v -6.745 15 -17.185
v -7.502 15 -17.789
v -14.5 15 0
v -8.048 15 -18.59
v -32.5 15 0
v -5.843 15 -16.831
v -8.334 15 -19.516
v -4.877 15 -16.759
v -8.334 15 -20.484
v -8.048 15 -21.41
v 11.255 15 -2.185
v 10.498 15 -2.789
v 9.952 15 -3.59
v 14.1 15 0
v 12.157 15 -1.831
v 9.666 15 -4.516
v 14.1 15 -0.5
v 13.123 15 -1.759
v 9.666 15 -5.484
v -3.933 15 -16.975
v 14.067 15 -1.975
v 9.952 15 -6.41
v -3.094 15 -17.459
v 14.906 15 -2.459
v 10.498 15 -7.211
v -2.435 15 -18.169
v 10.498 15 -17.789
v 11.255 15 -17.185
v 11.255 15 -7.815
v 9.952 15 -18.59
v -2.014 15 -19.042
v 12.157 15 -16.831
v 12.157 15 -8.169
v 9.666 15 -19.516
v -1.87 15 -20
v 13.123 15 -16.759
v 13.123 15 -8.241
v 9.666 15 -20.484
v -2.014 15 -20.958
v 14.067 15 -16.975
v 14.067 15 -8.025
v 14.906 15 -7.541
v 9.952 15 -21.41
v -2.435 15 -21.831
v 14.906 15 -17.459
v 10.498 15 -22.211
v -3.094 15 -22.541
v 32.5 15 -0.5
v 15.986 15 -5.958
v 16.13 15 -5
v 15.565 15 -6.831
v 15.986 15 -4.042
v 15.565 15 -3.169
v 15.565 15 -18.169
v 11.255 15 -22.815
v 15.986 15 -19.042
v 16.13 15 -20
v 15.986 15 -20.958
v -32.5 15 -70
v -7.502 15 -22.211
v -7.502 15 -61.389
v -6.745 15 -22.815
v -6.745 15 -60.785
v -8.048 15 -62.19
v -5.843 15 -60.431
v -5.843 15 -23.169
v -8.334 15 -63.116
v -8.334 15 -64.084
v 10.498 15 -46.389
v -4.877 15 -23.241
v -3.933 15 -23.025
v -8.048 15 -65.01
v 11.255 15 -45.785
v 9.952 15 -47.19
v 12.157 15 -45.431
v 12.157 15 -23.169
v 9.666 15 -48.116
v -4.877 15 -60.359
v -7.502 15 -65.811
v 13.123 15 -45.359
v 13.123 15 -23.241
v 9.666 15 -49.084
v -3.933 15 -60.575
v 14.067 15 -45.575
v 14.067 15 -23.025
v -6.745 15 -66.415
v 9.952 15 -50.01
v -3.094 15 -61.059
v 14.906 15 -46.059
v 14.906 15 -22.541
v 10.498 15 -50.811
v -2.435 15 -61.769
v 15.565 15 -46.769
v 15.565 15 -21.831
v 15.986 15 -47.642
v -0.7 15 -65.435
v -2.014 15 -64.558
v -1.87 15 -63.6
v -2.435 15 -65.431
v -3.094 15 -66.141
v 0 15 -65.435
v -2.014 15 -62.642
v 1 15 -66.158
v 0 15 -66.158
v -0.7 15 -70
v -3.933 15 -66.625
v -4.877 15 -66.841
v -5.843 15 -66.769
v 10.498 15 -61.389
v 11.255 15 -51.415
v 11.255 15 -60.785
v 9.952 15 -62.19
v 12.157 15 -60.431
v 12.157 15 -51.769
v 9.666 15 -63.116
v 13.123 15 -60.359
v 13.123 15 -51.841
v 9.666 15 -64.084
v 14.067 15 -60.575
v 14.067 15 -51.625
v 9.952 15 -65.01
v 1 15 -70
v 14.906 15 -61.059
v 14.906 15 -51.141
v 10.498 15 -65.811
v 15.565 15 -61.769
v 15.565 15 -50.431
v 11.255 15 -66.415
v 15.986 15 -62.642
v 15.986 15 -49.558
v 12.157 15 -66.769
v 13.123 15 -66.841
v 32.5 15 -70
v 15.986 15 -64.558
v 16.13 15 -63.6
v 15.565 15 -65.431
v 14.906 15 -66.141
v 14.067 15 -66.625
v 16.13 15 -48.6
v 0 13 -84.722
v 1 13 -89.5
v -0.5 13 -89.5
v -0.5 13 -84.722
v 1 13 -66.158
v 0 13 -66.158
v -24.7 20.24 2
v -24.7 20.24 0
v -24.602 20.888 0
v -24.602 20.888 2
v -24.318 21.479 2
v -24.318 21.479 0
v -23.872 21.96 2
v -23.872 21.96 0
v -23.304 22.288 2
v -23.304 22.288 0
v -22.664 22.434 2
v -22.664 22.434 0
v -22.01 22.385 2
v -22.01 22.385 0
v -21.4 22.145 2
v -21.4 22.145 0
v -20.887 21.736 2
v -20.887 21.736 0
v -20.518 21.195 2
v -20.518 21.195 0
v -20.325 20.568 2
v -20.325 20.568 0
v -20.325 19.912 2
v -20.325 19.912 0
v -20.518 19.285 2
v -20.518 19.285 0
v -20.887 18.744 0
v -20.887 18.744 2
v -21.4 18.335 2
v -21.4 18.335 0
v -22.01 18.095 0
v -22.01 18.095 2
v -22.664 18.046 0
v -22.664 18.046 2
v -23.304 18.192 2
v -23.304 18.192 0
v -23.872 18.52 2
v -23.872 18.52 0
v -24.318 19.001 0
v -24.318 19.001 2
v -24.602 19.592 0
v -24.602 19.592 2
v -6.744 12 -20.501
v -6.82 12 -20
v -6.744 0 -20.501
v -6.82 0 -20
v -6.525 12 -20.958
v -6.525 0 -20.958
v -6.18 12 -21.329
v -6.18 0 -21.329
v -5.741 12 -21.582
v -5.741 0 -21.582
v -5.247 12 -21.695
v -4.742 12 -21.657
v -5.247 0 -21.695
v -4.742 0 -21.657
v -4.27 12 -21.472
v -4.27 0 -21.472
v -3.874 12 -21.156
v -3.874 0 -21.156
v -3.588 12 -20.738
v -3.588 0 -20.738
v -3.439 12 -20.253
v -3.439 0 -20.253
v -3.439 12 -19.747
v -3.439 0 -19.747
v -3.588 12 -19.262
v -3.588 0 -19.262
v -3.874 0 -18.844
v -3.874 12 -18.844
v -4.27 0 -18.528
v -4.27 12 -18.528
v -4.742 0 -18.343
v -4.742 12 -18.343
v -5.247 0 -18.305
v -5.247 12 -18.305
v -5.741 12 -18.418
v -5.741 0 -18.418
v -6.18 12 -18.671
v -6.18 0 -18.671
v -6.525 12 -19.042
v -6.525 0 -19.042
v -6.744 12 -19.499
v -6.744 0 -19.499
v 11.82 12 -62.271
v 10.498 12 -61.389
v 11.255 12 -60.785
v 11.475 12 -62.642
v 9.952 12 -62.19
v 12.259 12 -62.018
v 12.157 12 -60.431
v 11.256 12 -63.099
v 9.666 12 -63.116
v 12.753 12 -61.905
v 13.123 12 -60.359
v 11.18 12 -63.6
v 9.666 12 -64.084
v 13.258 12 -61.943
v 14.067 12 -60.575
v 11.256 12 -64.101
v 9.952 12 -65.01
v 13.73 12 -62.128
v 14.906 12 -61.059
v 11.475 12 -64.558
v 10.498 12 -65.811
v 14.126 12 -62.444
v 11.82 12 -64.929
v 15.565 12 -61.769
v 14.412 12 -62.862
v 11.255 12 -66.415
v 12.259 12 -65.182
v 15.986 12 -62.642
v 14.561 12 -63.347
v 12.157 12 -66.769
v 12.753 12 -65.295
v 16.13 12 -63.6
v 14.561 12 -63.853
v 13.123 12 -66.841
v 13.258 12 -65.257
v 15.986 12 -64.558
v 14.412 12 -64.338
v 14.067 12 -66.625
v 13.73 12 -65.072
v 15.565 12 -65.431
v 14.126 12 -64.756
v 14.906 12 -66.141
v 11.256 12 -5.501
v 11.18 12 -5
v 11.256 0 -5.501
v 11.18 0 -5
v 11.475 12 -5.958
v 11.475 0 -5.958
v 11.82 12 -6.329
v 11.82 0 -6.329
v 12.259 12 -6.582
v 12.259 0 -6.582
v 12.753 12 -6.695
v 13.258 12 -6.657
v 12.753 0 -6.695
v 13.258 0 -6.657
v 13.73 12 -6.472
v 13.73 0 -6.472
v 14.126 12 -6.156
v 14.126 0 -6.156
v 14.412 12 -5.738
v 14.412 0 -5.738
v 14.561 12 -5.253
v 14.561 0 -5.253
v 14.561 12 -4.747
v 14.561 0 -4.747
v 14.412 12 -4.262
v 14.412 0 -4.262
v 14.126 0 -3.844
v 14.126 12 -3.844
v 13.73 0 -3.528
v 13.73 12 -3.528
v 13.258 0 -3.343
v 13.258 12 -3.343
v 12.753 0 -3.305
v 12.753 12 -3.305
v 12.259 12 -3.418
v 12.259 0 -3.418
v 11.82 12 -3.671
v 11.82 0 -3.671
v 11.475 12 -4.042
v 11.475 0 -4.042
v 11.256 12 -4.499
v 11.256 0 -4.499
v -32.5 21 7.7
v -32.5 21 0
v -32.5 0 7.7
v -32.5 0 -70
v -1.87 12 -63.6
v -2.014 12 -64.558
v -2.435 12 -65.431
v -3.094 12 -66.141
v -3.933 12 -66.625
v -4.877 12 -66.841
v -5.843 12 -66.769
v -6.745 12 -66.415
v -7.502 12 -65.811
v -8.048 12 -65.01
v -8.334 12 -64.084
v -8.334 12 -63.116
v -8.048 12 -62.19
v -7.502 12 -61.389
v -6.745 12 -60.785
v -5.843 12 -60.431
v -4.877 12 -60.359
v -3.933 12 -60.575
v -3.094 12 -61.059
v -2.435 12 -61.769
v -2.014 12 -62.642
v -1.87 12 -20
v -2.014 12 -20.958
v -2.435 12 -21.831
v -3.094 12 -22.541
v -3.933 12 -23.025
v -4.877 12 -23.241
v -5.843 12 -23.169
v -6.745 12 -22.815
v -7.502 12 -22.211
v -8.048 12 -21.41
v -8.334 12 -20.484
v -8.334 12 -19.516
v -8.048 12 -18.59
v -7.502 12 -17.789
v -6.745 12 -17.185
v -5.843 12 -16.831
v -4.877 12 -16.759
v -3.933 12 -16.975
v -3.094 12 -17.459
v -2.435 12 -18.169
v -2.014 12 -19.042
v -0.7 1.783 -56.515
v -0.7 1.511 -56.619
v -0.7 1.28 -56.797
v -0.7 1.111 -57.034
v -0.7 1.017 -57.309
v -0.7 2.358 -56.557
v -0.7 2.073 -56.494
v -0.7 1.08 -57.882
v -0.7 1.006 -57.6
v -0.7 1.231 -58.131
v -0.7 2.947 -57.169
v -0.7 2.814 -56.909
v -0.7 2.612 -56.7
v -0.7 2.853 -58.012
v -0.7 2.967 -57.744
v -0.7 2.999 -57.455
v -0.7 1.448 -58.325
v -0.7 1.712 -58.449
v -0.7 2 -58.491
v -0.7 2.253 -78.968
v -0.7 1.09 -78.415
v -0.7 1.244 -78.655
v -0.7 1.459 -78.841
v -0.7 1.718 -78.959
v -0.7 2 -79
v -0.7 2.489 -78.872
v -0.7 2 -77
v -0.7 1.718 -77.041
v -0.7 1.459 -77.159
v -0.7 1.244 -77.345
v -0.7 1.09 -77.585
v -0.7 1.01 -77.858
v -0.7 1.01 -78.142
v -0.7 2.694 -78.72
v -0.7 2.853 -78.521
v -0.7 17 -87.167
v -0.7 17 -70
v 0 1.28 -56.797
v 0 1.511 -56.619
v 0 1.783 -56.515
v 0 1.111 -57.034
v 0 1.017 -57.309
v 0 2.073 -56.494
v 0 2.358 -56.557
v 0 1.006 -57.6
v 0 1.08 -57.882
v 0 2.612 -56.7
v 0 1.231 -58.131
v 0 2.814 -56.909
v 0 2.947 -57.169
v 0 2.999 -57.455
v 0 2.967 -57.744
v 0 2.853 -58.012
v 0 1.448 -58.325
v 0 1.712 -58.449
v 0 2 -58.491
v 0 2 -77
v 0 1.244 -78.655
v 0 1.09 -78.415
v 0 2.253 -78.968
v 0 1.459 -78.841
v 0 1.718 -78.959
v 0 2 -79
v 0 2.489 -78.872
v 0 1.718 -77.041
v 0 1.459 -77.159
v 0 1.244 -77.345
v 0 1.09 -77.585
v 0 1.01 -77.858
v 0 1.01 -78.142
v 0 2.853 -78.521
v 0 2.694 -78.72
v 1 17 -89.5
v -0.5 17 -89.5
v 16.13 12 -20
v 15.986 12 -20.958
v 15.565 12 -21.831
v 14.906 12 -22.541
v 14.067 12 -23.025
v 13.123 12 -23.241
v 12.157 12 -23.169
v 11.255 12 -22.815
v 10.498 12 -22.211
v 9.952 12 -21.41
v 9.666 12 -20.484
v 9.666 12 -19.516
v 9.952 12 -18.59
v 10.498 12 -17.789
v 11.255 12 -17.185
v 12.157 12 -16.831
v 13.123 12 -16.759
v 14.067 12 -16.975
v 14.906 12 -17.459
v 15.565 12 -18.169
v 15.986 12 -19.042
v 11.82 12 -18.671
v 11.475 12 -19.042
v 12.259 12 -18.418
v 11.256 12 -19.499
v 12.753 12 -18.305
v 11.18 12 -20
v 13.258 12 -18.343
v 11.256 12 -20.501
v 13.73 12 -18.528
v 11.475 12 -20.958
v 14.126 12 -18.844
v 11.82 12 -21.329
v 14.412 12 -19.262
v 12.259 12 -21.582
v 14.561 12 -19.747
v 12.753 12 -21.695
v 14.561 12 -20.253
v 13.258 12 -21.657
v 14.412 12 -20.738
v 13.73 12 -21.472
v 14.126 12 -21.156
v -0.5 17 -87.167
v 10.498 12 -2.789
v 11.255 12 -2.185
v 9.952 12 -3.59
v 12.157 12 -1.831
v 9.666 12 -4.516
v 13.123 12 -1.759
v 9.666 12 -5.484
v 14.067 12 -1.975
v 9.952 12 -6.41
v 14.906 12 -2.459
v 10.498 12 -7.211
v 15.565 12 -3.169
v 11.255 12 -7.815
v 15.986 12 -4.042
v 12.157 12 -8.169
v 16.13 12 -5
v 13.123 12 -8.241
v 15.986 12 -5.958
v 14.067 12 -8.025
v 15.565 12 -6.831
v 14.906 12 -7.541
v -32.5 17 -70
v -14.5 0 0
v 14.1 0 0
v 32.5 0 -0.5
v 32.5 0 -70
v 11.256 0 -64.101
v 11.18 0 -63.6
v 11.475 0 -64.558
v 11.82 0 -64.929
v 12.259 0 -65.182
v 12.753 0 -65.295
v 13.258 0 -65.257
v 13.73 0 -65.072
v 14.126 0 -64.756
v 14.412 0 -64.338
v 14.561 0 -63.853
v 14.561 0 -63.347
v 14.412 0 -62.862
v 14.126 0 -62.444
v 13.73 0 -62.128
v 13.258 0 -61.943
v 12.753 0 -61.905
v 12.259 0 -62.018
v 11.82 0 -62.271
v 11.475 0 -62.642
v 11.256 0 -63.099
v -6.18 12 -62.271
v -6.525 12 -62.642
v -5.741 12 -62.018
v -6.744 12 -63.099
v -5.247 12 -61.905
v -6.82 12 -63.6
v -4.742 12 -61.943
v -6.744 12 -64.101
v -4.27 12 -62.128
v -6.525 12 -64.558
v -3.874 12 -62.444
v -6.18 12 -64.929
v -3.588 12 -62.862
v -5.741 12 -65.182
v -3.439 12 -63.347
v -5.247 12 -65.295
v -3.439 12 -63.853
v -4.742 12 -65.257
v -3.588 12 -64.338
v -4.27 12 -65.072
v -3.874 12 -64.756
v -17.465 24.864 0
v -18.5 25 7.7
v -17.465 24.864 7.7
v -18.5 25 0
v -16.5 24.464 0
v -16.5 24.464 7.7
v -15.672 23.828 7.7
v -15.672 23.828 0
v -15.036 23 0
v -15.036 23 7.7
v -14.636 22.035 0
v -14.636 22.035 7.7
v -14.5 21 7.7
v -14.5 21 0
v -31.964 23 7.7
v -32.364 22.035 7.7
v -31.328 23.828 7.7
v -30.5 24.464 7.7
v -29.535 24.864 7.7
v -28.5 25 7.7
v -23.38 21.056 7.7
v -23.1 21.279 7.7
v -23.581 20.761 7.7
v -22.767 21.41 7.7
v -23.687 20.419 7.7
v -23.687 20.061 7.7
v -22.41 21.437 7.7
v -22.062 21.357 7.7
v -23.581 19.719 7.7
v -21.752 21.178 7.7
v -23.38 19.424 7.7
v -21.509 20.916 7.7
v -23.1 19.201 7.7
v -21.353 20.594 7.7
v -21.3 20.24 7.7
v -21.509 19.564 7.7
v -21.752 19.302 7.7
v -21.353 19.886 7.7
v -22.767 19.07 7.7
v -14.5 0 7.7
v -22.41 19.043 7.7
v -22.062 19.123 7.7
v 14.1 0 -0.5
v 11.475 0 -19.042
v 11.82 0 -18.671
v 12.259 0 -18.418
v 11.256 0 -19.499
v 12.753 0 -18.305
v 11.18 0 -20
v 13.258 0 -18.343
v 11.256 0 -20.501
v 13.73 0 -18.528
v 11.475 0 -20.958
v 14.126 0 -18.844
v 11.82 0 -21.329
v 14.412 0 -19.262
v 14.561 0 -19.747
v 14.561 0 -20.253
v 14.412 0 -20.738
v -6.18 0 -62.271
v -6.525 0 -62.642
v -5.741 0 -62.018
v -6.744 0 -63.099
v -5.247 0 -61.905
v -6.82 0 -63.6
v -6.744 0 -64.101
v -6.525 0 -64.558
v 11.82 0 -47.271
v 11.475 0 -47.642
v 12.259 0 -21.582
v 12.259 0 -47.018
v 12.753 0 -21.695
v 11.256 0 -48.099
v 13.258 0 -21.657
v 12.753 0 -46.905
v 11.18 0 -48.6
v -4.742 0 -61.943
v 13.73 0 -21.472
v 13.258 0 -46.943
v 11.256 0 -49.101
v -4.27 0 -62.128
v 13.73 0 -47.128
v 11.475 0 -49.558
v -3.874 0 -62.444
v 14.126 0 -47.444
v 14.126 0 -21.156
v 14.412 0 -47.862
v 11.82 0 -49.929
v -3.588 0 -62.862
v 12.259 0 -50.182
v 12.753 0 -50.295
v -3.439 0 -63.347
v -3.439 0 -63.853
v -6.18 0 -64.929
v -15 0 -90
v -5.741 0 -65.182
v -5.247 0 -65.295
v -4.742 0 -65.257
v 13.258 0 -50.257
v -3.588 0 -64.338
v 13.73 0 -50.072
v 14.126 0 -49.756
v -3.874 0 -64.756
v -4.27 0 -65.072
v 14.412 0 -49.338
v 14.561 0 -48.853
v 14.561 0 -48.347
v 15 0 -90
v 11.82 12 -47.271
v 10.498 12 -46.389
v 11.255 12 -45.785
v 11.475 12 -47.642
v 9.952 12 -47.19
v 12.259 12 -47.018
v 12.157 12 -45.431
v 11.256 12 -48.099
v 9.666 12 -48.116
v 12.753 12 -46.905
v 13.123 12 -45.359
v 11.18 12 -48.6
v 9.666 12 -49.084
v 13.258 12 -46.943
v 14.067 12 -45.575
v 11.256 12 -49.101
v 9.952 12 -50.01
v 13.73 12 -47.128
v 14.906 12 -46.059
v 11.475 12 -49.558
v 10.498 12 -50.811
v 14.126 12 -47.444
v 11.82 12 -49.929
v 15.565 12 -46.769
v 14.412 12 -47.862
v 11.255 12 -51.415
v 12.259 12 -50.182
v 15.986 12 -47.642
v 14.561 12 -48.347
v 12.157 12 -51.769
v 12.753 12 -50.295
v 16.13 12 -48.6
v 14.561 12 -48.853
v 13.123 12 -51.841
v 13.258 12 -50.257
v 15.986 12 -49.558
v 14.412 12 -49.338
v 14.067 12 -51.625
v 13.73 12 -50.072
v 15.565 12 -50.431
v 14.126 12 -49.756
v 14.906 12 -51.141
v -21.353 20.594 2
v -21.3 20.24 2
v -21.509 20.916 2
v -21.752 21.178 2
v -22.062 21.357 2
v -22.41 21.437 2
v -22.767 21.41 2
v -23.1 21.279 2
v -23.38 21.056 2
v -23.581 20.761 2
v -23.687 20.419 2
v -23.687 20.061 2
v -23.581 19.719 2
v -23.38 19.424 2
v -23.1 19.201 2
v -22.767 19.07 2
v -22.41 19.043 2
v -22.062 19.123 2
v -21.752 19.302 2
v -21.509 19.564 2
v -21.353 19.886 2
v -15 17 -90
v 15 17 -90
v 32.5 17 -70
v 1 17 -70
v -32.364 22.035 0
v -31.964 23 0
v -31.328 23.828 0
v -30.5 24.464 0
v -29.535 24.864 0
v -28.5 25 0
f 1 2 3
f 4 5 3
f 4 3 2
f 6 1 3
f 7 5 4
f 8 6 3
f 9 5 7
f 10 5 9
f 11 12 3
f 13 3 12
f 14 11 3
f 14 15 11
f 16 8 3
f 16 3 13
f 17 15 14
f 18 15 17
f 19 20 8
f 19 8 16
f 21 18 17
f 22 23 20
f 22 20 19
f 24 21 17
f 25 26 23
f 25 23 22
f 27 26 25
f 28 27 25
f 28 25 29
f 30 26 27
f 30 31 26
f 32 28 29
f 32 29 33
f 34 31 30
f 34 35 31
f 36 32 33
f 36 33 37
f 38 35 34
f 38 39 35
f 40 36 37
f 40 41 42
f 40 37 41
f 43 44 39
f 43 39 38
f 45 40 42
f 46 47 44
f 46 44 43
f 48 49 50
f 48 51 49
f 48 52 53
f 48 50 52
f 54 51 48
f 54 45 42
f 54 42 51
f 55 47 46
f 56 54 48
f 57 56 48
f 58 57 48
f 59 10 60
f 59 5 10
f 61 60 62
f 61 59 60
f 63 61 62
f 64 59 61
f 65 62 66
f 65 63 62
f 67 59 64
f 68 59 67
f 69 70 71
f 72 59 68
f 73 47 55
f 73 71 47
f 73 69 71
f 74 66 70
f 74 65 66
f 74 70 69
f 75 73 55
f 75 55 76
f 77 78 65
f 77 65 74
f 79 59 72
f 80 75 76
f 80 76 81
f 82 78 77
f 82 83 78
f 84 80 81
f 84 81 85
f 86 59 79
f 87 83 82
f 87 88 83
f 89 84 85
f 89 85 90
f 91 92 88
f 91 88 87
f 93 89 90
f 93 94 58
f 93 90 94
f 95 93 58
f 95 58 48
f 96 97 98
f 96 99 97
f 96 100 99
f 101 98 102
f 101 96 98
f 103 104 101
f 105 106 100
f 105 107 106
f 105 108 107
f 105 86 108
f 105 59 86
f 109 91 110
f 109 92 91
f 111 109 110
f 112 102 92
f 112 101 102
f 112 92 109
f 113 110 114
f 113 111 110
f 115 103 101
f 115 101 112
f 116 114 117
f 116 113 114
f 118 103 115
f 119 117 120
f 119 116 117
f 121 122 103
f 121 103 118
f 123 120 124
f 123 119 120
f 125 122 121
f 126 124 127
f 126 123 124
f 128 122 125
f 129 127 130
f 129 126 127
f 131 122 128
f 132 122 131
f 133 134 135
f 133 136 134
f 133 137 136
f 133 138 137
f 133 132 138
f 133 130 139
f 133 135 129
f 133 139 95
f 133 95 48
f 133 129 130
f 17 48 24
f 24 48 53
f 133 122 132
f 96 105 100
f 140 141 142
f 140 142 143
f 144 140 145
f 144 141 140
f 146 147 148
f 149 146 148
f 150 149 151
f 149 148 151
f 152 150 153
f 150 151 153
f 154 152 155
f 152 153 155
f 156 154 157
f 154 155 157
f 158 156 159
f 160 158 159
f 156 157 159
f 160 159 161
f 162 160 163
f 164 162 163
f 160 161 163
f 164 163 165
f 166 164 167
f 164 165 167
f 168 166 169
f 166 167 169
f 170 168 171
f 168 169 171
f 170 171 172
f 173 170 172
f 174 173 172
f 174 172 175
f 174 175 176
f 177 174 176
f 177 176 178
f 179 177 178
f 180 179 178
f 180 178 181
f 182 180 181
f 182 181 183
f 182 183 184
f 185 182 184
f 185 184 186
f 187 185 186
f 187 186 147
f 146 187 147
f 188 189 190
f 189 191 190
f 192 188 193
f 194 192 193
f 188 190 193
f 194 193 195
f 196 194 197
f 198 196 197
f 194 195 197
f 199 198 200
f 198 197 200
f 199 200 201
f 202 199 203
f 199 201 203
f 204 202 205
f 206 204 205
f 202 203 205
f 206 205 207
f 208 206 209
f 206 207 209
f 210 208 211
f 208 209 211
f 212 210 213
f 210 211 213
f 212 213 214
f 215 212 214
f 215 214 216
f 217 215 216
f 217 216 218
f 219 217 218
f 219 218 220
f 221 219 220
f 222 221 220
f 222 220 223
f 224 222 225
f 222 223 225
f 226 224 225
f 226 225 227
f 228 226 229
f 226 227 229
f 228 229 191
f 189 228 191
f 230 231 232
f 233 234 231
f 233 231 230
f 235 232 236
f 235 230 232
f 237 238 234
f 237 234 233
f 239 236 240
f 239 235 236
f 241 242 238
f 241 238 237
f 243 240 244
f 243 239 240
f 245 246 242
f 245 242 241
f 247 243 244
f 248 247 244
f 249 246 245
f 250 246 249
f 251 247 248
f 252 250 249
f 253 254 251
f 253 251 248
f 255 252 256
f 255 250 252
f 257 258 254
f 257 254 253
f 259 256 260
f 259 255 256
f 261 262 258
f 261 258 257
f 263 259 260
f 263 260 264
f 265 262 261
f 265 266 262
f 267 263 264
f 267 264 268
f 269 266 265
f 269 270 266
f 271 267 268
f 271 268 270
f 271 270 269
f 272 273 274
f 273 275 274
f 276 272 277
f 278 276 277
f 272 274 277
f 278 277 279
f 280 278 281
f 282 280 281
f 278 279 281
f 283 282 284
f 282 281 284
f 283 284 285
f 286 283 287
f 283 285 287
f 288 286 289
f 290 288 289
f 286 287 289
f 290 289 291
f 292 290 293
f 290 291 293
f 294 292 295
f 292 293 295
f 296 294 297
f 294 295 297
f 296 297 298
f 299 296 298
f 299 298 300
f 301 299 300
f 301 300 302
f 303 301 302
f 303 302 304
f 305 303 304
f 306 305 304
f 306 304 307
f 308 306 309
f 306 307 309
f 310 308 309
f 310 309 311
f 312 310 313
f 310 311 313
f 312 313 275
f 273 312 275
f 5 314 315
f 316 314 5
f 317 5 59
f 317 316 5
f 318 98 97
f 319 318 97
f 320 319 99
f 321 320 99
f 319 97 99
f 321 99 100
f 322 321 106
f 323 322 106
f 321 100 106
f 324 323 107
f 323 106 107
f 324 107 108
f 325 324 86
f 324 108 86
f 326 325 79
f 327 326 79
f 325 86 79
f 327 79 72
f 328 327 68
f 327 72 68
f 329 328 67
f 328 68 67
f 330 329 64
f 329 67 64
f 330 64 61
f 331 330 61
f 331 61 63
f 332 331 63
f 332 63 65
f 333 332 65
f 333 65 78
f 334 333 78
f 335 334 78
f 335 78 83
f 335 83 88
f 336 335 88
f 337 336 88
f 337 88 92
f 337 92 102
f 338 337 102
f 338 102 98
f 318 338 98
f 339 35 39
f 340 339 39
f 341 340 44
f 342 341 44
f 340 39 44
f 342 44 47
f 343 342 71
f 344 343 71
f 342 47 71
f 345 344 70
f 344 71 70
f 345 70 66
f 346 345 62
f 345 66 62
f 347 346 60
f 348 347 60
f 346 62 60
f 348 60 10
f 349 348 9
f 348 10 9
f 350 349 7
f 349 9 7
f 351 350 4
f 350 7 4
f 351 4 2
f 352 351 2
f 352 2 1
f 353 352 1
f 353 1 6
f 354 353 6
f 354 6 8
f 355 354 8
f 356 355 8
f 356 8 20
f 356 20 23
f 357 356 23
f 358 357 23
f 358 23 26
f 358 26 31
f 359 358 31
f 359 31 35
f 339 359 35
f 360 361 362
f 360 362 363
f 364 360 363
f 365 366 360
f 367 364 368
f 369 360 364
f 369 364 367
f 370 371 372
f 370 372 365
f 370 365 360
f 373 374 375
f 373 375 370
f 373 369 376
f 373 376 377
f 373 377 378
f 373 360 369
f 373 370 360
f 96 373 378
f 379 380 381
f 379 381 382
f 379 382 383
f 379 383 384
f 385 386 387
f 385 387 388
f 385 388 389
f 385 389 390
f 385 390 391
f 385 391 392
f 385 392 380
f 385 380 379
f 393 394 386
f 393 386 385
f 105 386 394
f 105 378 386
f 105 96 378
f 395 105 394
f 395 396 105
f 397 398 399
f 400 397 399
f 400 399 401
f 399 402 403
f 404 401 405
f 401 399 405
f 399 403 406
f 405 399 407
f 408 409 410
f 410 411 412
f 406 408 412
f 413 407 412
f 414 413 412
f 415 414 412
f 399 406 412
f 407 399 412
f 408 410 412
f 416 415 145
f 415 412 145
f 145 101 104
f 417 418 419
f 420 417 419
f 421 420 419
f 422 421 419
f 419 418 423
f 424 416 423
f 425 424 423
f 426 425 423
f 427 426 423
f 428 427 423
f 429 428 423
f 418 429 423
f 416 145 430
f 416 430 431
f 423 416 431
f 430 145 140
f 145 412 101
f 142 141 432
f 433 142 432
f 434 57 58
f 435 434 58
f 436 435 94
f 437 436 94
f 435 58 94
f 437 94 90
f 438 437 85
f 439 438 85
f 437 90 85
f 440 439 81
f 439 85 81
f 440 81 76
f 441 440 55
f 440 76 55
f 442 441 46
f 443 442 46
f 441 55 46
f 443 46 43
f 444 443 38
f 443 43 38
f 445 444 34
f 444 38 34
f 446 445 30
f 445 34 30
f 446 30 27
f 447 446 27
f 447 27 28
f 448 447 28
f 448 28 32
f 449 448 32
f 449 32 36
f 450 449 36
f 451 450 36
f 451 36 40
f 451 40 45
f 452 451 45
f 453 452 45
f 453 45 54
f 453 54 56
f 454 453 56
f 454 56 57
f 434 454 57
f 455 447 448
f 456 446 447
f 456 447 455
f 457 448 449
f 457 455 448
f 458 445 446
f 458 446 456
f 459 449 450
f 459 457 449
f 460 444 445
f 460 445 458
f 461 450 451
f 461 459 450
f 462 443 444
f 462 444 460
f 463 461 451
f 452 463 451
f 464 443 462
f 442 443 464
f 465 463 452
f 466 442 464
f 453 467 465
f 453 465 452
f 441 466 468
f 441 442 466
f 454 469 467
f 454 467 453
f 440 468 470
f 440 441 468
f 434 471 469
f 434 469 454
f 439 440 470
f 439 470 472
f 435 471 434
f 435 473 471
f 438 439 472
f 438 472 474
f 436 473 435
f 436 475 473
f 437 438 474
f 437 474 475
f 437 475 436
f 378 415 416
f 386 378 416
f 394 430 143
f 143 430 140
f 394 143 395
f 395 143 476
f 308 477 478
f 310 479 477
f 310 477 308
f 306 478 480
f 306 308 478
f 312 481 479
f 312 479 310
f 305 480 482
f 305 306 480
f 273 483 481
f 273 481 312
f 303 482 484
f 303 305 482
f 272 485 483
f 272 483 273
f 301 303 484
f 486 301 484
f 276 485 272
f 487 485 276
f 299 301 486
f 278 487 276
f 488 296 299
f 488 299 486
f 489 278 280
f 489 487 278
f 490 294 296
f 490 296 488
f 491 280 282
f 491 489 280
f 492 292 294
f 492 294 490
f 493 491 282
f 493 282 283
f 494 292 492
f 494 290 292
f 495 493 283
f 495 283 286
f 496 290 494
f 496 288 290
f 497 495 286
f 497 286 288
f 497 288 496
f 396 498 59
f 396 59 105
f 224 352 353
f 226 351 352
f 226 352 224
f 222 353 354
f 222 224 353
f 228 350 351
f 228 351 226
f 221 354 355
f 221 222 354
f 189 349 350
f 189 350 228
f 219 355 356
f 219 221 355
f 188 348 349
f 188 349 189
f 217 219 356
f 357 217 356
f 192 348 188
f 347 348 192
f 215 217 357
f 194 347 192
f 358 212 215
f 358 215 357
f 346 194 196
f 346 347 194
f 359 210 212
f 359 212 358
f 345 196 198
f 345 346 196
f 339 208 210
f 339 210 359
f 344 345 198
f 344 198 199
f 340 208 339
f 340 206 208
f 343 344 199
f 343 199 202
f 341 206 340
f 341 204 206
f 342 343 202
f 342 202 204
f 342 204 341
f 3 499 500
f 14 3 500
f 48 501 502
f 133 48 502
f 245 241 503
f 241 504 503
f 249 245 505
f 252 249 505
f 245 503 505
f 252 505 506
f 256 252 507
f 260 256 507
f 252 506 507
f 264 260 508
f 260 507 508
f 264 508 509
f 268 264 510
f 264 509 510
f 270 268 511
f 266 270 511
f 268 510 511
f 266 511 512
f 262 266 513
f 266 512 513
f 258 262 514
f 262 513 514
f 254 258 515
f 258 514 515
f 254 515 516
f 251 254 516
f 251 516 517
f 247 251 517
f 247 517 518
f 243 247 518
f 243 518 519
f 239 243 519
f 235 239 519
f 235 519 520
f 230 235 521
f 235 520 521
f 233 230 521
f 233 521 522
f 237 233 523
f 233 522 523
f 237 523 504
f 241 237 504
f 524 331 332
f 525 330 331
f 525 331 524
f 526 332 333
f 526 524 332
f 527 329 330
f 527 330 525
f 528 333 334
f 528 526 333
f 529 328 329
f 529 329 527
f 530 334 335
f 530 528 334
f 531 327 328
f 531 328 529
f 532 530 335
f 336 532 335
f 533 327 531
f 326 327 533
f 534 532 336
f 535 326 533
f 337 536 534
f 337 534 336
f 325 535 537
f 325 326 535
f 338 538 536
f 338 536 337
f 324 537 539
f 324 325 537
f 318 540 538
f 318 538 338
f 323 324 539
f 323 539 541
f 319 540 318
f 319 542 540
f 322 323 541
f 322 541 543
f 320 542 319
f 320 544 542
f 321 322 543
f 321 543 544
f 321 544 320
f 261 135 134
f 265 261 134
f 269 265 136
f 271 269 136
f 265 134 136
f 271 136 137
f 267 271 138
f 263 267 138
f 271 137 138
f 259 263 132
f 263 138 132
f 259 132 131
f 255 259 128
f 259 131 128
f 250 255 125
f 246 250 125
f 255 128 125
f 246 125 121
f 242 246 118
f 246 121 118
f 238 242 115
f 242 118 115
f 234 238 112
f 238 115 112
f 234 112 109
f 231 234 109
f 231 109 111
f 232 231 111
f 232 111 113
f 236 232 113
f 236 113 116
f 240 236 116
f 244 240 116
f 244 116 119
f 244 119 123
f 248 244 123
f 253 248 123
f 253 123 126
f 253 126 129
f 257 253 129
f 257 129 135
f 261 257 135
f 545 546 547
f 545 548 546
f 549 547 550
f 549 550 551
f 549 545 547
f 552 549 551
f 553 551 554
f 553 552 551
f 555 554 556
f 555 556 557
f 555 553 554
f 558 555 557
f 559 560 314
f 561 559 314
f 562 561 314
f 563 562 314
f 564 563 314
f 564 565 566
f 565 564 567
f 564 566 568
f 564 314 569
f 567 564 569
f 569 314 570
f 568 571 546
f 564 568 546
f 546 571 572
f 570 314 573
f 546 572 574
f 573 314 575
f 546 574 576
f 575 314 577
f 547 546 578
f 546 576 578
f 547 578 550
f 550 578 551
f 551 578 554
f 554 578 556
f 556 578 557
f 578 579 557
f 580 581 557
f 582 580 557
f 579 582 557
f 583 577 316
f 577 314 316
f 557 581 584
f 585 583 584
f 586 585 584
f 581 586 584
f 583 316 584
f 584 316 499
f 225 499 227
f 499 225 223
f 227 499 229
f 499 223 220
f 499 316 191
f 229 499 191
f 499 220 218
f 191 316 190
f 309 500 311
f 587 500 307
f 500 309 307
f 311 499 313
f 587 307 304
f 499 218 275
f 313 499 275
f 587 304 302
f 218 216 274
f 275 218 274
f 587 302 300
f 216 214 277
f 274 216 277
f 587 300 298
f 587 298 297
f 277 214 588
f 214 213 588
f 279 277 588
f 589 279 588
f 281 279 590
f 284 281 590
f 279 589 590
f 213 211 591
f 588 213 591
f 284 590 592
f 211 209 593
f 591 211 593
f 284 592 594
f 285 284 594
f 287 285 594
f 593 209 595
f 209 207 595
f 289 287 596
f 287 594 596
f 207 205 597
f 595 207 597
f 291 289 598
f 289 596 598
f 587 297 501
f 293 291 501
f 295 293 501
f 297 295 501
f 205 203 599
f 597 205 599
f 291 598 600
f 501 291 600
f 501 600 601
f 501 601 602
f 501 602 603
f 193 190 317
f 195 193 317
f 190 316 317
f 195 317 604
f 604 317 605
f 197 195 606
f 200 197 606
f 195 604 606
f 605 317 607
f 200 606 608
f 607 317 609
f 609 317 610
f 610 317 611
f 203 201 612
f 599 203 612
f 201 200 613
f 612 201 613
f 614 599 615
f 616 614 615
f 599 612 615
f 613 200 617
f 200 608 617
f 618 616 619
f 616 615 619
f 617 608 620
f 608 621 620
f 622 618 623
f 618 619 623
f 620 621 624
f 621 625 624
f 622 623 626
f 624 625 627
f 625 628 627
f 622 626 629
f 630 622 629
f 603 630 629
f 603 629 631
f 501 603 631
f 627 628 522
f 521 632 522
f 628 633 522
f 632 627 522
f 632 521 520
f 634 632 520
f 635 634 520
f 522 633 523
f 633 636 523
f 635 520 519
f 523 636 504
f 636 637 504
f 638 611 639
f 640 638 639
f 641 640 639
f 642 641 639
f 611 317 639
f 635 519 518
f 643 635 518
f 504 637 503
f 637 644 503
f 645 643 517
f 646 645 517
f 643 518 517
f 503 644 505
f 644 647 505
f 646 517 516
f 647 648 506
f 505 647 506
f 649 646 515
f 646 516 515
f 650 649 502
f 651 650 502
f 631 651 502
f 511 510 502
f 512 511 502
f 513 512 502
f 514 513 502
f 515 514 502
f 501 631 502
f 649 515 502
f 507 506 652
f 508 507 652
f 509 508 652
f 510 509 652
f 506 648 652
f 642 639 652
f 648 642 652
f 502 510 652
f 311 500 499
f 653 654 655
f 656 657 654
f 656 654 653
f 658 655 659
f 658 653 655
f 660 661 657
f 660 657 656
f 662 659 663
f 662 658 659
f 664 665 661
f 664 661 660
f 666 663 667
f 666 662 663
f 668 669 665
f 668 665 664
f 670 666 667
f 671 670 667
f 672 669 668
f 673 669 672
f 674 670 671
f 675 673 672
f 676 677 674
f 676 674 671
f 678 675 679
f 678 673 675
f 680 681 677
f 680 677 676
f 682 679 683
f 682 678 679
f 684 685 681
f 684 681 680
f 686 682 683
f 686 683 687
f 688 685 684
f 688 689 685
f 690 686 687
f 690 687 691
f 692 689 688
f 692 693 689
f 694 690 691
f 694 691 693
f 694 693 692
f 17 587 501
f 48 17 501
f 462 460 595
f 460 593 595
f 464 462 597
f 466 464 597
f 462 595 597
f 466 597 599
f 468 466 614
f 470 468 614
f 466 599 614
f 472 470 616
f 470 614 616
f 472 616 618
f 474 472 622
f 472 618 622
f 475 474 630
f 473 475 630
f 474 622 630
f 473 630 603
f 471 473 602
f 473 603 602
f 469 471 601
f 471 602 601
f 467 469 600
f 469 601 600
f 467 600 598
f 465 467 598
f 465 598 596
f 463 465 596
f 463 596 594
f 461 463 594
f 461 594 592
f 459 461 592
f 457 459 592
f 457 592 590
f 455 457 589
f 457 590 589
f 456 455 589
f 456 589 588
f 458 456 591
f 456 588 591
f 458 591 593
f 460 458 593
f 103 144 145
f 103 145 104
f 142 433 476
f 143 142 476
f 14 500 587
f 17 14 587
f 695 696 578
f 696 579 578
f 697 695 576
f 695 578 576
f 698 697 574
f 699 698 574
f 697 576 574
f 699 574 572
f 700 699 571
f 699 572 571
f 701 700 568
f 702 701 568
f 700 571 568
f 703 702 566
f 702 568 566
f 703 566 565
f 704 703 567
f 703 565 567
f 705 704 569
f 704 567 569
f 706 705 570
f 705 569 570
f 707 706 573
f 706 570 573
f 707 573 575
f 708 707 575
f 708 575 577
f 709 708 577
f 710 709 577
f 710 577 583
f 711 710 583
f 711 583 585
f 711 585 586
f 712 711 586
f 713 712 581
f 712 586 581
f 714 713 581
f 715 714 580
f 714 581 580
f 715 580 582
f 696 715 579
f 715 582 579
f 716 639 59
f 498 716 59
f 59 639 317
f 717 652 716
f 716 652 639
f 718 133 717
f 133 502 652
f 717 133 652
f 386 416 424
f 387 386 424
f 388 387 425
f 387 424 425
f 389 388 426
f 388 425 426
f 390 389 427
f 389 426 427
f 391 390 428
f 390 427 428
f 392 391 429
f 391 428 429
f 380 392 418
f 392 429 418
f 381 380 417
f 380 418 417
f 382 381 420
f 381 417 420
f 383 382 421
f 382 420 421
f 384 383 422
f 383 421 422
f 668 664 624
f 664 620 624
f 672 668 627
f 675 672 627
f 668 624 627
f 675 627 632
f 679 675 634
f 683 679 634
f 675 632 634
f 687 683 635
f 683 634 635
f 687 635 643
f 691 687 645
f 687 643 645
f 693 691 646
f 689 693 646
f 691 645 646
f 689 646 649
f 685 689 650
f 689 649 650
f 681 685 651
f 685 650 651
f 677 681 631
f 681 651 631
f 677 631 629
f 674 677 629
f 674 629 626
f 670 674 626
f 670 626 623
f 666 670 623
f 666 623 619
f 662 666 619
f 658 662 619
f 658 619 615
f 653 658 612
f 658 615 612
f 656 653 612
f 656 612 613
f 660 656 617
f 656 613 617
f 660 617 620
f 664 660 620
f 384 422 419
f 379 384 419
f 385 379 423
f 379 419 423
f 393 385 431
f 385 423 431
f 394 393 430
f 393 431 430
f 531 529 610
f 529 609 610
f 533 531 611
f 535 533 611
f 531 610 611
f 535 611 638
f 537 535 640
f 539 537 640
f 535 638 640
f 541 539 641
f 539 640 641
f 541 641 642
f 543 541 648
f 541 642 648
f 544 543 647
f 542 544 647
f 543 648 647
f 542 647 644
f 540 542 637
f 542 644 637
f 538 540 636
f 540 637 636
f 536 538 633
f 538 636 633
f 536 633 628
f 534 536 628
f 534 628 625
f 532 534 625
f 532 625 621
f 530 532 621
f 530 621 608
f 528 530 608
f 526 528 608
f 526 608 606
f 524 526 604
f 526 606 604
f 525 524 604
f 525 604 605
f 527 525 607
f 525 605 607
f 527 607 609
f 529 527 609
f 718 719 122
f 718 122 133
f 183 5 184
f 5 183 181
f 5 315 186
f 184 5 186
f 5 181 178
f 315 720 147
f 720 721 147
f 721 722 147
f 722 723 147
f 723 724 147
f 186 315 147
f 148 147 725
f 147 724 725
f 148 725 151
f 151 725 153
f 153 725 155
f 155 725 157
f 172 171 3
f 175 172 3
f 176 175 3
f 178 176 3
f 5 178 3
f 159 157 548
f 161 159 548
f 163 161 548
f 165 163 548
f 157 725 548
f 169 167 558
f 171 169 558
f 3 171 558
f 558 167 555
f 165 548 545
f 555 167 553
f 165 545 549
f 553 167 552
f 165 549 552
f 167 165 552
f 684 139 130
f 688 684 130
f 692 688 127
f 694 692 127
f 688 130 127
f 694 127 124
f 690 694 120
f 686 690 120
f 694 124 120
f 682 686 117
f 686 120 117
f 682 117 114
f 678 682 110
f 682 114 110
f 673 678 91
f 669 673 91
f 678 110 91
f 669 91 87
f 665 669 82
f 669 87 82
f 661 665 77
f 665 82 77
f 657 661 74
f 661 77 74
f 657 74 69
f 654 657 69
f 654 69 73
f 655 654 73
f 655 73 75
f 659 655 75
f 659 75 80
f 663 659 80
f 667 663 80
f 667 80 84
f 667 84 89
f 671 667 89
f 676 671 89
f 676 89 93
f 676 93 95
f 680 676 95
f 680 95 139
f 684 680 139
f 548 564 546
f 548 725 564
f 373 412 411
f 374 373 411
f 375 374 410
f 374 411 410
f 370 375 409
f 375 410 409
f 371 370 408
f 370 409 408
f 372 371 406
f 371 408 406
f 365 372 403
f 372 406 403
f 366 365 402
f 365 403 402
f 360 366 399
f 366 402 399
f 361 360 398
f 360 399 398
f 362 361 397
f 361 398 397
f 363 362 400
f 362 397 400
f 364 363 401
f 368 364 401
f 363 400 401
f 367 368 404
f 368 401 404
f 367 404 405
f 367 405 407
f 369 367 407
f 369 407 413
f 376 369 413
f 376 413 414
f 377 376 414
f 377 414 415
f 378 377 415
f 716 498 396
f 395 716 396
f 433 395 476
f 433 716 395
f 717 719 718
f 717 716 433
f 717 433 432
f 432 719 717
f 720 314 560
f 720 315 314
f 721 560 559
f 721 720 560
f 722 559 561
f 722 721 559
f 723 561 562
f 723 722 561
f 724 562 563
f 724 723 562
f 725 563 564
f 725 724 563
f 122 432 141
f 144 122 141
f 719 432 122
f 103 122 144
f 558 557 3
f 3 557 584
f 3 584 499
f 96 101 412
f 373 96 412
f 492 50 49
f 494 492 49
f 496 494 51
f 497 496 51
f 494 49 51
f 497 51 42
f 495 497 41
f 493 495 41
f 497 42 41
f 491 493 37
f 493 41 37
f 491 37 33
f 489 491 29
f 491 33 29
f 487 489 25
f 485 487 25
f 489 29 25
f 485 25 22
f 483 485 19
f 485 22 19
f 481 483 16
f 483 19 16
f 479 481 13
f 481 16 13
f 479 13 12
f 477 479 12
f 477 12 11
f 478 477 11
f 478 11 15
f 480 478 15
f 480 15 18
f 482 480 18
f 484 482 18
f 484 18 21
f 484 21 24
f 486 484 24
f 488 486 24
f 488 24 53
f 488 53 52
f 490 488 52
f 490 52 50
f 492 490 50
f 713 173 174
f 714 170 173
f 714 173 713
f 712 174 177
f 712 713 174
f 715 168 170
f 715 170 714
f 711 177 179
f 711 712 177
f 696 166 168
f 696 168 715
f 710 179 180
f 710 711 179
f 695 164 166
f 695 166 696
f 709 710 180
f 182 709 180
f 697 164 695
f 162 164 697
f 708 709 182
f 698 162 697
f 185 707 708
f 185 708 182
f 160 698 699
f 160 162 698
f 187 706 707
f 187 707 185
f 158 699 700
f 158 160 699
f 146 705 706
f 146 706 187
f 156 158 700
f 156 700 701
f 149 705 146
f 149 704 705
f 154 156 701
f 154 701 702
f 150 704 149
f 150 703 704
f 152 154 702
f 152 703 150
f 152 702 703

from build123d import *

# Parameters (mm, degrees)
BOSS_EXTRUDE1_DEPTH            = 17
BOSS_EXTRUDE2_START            = 17
SKETCH1_3_W                    = 18
SKETCH1_3_H                    = 7.7
BOSS_EXTRUDE2_DEPTH            = 8
SKETCH9_W                      = 65
SKETCH9_H                      = 70
CUT_EXTRUDE5_DEPTH             = 2
CBORE_FOR_M3_SHCS2_D           = 3.4
CBORE_FOR_M3_SHCS2_CBORE_D     = 6.5
CBORE_FOR_M3_SHCS2_CBORE_DEPTH = 3
SKETCH4_R                      = 1
CUT_EXTRUDE3_DEPTH             = 0.7
CUT_EXTRUDE4_DEPTH             = 0.5
CUT_EXTRUDE4_DEPTH_BACK        = 1
SKETCH6_W                      = 23.342383579
SKETCH6_H                      = 4
CBORE_FOR_M2_SHCS1_D           = 2.4
CBORE_FOR_M2_SHCS1_CBORE_D     = 4.4
CBORE_FOR_M2_SHCS1_CBORE_DEPTH = 2
FILLET1_R                      = 4


with BuildPart() as part:
    # Sketch1 → Boss-Extrude1 (new body)
    with BuildSketch(Plane(origin=(0, 0, 0), x_dir=(1, 0, 0), z_dir=(0, 1, 0))):
        Polygon((32.5, 0.5), (32.5, 70), (15, 90), (-15, 90), (-32.5, 70), (-32.5, -7.7), (-14.5, -7.7), (-14.5, 0), (14.1, 0), (14.1, 0.5), align=None)
    extrude(amount=BOSS_EXTRUDE1_DEPTH)

    # Sketch1<3> → Boss-Extrude2 (add)
    with BuildSketch(Plane(origin=(0, 0, 0), x_dir=(1, 0, 0), z_dir=(0, 1, 0)).offset(BOSS_EXTRUDE2_START)):
        with Locations((-23.5, -3.85)):
            Rectangle(SKETCH1_3_W, SKETCH1_3_H)
    extrude(amount=BOSS_EXTRUDE2_DEPTH)

    # Sketch9 → Cut-Extrude5 (cut)
    with BuildSketch(Plane(origin=(0, 17, 0), x_dir=(1, 0, 0), z_dir=(0, 1, 0))):
        with Locations((0, 35)):
            Rectangle(SKETCH9_W, SKETCH9_H)
    extrude(amount=-CUT_EXTRUDE5_DEPTH, mode=Mode.SUBTRACT)

    # CBORE for M3 SHCS2 (through all)
    with Locations(Plane(origin=(0, 15, 0), x_dir=(1, 0, 0), z_dir=(0, 1, 0))):
        with Locations((-5.12, 20), (12.88, 20), (-5.12, 63.6), (12.88, 63.6), (12.88, 5), (12.88, 48.6)):
            CounterBoreHole(CBORE_FOR_M3_SHCS2_D / 2, CBORE_FOR_M3_SHCS2_CBORE_D / 2, CBORE_FOR_M3_SHCS2_CBORE_DEPTH)

    # Sketch4 → Cut-Extrude3 (cut)
    with BuildSketch(Plane(origin=(0, 0, 0), x_dir=(0, 0, -1), z_dir=(1, 0, 0))):
        with BuildLine():
            ThreePointArc((78.521450009, 2.853281834), (77.510842566, 2.872195508), (77, 2))
            Line((77, 2), (78, 2))
            Line((78, 2), (78.521450009, 2.853281834))
        make_face()
        with BuildLine():
            Line((78, 2), (77, 2))
            ThreePointArc((77, 2), (78, 1), (79, 2))
            ThreePointArc((79, 2), (78.872195508, 2.489157434), (78.521450009, 2.853281834))
            Line((78.521450009, 2.853281834), (78, 2))
        make_face()
        with BuildLine():
            Line((58.012399764, 2.853281834), (57.490949754, 2))
            Line((57.490949754, 2), (58.490949754, 2))
            ThreePointArc((58.490949754, 2), (58.363145263, 2.489157434), (58.012399764, 2.853281834))
        make_face()
        with BuildLine():
            Line((58.490949754, 2), (57.490949754, 2))
            Line((57.490949754, 2), (58.012399764, 2.853281834))
            ThreePointArc((58.012399764, 2.853281834), (56.618754246, 1.510842566), (58.490949754, 2))
        make_face()
        with Locations((57.490949754, 2)):
            Circle(SKETCH4_R)
        with Locations((78, 2)):
            Circle(SKETCH4_R)
        Polygon((57.490949754, 2), (78, 2), (89, 20), (68.490949754, 20), align=None)
    extrude(amount=-CUT_EXTRUDE3_DEPTH, mode=Mode.SUBTRACT)

    # Sketch6 → Cut-Extrude4 (cut, two sides: drawn at the far end of the back side and taken through both)
    with BuildSketch(Plane.ZY.offset(-CUT_EXTRUDE4_DEPTH_BACK)):
        with Locations((-77.828808211, 15)):
            Rectangle(SKETCH6_W, SKETCH6_H)
    extrude(amount=CUT_EXTRUDE4_DEPTH + CUT_EXTRUDE4_DEPTH_BACK, mode=Mode.SUBTRACT)

    # CBORE for M2 SHCS1 (through all)
    with Locations(Plane(origin=(0, 0, 0), x_dir=(-1, 0, 0), z_dir=(0, 0, -1))):
        with Locations((22.5, 20.24)):
            CounterBoreHole(CBORE_FOR_M2_SHCS1_D / 2, CBORE_FOR_M2_SHCS1_CBORE_D / 2, CBORE_FOR_M2_SHCS1_CBORE_DEPTH)

    # Fillet1
    fillet1_edges = [part.edges().sort_by_distance(p)[0] for p in [
        (-32.5, 25, 3.85),
        (-14.5, 25, 3.85),
    ]]
    fillet(fillet1_edges, radius=FILLET1_R)


solid = part.part
